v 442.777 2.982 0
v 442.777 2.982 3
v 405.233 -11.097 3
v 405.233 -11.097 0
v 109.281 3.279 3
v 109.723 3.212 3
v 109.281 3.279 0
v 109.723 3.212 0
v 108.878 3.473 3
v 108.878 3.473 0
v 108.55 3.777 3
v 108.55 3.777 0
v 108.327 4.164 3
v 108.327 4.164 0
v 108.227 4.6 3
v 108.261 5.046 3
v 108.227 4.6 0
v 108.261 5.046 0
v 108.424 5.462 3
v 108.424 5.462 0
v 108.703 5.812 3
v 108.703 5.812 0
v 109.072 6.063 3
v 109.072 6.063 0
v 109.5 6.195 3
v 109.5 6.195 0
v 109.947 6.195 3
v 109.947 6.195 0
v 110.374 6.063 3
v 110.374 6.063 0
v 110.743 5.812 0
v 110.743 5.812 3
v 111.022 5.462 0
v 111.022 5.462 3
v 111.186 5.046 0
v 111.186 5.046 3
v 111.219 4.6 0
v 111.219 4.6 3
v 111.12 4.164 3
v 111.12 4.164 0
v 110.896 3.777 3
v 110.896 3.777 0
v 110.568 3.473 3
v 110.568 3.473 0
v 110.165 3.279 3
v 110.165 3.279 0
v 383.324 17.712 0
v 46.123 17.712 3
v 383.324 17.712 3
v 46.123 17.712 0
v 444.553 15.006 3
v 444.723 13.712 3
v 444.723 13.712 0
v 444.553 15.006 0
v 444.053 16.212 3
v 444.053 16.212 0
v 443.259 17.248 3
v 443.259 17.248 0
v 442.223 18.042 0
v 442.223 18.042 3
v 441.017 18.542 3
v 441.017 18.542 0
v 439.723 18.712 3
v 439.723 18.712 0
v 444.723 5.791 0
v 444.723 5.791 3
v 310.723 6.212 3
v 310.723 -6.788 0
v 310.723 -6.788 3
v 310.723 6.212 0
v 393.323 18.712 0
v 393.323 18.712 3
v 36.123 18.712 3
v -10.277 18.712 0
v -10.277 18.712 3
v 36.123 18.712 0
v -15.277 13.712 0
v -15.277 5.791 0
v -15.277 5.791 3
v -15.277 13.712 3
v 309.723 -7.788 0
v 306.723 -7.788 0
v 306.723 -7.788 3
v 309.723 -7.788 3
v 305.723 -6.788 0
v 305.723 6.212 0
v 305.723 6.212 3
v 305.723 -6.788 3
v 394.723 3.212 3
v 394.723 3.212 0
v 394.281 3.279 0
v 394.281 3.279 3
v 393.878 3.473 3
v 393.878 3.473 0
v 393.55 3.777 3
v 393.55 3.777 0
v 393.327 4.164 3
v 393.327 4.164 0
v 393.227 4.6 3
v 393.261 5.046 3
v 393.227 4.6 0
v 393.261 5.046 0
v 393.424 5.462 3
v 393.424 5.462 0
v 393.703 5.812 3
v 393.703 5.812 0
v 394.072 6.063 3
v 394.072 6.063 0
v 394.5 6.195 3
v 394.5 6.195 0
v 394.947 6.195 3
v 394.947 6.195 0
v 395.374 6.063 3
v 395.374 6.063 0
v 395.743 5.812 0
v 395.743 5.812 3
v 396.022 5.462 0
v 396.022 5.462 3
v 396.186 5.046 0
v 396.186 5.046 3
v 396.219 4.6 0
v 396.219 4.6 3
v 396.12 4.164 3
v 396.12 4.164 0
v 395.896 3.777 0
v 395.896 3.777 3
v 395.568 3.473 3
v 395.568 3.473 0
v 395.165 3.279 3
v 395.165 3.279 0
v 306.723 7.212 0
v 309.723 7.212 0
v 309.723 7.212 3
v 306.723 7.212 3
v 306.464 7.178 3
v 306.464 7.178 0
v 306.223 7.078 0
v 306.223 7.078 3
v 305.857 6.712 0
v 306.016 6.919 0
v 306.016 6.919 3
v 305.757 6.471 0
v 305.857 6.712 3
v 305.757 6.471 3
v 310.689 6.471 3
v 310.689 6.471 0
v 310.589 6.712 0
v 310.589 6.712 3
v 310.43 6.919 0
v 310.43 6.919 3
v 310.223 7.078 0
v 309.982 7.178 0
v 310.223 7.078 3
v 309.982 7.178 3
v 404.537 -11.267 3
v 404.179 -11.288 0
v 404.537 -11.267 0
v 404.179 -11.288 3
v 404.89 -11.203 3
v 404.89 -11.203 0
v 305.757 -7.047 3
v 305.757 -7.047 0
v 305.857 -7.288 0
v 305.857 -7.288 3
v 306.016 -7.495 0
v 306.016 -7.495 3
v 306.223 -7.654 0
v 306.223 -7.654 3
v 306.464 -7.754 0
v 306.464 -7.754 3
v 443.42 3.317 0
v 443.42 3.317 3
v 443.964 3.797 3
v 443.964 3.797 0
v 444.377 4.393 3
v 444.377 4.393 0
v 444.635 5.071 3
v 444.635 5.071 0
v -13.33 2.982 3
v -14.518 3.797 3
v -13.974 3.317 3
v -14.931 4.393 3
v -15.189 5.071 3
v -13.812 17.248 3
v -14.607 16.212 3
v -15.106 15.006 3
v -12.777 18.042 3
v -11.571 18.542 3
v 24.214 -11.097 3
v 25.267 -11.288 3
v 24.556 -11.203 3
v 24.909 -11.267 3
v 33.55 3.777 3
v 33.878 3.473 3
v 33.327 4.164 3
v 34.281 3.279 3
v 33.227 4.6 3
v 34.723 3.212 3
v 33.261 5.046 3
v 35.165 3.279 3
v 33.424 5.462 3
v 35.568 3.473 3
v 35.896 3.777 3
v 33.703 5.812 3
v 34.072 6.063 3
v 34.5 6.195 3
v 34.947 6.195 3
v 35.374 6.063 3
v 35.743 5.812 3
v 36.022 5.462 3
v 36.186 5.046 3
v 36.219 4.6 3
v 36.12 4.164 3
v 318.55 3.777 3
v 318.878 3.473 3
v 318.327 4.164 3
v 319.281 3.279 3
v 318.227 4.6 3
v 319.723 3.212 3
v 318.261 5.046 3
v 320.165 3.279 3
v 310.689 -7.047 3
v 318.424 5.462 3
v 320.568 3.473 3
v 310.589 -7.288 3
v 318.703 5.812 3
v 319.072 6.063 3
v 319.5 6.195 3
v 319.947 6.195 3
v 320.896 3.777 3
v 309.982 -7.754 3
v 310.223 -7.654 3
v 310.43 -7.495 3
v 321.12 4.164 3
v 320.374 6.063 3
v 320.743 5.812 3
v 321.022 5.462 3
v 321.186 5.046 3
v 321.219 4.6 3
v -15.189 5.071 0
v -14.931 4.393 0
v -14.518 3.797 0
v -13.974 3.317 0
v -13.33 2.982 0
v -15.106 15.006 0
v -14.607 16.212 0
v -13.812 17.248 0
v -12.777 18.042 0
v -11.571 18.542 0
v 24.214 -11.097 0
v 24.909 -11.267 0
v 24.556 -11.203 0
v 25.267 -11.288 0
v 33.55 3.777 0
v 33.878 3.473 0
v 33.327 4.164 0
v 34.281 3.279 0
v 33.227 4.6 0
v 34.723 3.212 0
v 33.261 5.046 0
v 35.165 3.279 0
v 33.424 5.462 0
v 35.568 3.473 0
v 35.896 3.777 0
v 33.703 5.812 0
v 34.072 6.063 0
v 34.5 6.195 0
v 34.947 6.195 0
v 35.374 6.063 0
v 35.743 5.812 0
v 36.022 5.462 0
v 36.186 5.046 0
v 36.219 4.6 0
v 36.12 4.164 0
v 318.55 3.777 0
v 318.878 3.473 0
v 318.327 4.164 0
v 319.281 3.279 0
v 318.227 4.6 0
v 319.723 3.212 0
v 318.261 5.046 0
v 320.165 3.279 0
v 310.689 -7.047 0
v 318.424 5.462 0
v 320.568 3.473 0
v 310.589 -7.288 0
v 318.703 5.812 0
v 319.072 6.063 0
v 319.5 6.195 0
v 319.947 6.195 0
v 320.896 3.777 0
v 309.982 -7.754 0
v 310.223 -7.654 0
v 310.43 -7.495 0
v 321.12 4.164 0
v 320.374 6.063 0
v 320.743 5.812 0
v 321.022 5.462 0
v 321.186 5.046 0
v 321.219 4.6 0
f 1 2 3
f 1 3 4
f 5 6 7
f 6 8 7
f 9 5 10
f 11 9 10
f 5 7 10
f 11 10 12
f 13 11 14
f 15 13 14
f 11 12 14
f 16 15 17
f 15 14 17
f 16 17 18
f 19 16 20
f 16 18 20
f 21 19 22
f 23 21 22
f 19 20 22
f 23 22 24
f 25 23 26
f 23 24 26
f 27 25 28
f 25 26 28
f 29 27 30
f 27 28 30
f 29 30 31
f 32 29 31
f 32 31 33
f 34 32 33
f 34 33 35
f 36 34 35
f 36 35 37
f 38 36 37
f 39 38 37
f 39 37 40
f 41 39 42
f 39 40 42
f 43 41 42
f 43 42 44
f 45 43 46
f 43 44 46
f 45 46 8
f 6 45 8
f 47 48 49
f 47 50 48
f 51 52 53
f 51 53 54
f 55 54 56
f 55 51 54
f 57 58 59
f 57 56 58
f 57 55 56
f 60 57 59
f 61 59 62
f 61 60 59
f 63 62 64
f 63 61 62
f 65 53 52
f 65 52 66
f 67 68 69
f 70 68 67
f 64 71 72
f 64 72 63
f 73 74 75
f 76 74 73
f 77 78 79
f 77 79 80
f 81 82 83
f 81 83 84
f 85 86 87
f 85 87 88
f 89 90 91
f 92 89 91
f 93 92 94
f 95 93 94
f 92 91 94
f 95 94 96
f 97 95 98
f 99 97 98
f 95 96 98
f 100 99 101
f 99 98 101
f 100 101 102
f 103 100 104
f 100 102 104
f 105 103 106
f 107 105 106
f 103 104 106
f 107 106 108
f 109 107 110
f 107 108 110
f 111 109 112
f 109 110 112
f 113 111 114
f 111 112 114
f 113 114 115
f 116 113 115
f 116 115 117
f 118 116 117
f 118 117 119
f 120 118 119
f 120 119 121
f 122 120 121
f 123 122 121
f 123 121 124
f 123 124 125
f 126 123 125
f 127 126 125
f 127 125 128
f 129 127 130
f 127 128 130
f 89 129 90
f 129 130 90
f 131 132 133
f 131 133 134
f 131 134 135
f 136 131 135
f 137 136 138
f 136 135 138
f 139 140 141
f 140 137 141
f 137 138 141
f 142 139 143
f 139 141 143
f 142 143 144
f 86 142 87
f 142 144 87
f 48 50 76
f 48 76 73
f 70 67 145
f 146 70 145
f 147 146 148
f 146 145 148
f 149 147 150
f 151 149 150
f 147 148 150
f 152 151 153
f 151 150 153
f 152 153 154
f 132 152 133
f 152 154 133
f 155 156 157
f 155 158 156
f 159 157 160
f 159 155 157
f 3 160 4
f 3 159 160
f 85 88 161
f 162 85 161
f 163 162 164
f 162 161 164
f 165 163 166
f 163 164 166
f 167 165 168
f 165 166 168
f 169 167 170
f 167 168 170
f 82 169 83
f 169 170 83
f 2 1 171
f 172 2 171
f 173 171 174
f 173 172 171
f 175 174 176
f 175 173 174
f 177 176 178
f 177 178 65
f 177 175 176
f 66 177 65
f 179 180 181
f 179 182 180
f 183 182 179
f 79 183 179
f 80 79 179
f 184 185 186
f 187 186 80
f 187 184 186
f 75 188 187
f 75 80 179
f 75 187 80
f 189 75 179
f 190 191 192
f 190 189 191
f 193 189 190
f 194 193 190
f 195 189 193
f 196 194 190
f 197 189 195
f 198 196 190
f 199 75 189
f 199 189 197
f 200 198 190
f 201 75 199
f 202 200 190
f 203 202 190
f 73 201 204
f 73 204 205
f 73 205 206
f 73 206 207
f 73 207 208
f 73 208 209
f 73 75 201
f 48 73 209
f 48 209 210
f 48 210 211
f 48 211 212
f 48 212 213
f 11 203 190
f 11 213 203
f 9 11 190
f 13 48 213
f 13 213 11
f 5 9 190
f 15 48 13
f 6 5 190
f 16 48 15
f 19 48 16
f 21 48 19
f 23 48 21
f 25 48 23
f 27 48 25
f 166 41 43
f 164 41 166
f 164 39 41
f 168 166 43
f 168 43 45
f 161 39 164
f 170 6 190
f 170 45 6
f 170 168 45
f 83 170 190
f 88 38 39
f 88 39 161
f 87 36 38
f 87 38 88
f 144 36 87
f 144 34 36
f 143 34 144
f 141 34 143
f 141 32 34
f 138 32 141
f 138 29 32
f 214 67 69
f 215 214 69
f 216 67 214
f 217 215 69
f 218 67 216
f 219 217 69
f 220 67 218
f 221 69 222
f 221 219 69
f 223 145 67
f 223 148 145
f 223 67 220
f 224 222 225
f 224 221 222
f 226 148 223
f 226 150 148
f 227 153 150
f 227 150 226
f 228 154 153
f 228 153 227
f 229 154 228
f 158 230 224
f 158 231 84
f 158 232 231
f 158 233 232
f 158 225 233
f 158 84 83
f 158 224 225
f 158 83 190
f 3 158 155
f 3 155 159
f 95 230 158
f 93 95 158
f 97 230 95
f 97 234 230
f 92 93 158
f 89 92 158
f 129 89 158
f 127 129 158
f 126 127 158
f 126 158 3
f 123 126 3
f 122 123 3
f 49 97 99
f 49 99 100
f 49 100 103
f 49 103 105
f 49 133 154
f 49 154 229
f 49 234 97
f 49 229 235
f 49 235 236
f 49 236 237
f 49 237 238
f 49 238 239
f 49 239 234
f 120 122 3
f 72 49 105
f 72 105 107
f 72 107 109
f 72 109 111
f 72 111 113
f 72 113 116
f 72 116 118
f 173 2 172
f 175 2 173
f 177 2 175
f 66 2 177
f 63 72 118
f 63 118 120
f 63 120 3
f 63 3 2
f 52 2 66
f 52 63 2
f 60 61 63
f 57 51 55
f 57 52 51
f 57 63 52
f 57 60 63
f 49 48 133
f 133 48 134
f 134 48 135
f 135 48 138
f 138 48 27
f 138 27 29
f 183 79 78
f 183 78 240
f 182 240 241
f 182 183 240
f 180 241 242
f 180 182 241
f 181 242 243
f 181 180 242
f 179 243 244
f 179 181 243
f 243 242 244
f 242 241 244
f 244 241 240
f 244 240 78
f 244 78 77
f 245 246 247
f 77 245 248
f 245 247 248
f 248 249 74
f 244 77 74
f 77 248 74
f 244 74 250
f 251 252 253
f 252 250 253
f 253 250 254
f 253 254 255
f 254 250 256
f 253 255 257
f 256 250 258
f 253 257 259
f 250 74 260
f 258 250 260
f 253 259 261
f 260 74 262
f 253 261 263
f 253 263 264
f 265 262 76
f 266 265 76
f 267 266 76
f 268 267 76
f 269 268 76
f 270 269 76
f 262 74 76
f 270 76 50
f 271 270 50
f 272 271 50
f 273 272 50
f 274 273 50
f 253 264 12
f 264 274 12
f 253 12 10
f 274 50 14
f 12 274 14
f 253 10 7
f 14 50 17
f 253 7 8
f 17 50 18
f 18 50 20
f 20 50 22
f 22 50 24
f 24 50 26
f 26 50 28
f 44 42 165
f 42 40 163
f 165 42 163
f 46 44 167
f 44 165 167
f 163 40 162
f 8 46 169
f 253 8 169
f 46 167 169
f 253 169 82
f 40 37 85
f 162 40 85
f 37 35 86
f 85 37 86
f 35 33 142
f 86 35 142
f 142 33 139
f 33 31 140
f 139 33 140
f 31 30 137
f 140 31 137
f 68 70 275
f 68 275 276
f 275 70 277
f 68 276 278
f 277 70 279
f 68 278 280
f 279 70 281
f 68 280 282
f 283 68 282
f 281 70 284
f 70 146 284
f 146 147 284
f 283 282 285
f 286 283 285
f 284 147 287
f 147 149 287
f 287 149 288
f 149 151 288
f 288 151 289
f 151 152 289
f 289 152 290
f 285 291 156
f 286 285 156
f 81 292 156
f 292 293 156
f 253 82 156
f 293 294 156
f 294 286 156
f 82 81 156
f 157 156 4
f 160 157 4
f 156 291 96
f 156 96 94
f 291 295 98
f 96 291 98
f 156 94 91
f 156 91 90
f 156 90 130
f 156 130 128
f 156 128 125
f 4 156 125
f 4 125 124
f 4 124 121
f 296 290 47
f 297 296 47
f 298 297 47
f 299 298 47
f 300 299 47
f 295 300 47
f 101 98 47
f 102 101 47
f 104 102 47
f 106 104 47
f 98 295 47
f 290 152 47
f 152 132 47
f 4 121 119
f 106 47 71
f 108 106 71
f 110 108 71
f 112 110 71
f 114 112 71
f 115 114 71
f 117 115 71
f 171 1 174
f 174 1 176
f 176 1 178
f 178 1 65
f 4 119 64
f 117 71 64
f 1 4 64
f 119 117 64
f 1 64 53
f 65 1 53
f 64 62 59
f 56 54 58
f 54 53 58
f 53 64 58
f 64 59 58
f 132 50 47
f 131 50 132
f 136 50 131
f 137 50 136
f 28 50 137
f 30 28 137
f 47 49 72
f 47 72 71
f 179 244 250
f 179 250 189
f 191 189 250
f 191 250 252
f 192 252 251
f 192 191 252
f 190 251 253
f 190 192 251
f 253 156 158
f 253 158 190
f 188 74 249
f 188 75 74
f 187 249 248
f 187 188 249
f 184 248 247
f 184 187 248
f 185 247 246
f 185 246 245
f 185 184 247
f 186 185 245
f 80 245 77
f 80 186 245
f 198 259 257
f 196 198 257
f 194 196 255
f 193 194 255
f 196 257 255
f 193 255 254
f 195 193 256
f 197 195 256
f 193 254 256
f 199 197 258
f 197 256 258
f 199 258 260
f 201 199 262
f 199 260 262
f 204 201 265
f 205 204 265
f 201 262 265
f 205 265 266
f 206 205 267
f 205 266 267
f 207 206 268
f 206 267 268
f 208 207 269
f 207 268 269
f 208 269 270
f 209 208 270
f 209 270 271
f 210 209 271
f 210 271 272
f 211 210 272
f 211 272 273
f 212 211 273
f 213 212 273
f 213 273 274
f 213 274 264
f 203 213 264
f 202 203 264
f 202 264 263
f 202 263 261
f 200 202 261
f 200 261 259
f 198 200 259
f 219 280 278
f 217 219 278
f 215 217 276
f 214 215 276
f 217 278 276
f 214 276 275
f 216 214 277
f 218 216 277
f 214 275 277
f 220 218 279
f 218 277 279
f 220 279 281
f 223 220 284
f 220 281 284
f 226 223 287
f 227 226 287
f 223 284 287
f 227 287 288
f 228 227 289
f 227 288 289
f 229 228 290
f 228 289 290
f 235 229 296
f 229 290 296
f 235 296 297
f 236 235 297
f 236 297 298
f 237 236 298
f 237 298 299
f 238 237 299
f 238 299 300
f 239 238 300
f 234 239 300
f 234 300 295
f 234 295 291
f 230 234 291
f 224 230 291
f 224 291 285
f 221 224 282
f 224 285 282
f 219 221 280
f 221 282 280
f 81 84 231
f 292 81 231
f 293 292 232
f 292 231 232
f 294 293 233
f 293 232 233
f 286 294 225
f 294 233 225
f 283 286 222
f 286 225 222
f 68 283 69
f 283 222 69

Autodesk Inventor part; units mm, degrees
ref_plane "YZ Plane" through (0, 0, 0) normal (1, 0, 0) x (0, 1, 0)
ref_plane "XZ Plane" through (0, 0, 0) normal (0, 1, 0) x (-1, 0, 0)
ref_plane "XY Plane" through (0, 0, 0) normal (0, 0, 1) x (1, 0, 0)
sketch "Szkic1" plane through (0, 0, 0) normal (0, 0, 1) x (1, 0, 0)
  line L0 (444.7232, 18.712) -> (444.7232, -11.288)
  line L1 (444.7232, -11.288) -> (-15.2768, -11.288)
  line L2 (-15.2768, -11.288) -> (-15.2768, 18.712)
  line L3 (-15.2768, 18.712) -> (36.1232, 18.712)
  line L4 (36.1232, 18.712) -> (36.1232, 17.712)
  line L5 (36.1232, 17.712) -> (393.3232, 17.712)
  line L6 (393.3232, 17.712) -> (393.3232, 18.712)
  line L7 (393.3232, 18.712) -> (444.7232, 18.712)
  point P0 (0, 0)
  dimension "d0" = 460
  dimension "d1" = 30
  dimension "d2" = 1
  dimension "d3" = 51.4
  dimension "d4" = 51.4
extrude "Wyciągnięcie proste1" add sketch "Szkic1" along normal blind 3
chamfer "Faza1" distance 10 distance2 1 1 edges at (36.1232, 17.712, 1.5) measured on face at (274.2565, 17.712, 1)
chamfer "Faza2" distance 10 distance2 1 1 edges at (393.3232, 17.712, 1.5) measured on face at (277.5897, 17.712, 1)
fillet "Zaokrąglenie1" radius 5 2 edges at (444.7232, 18.712, 1.5) (-15.2768, 18.712, 1.5)
chamfer "Faza3" distance 40 distance2 15 1 edges at (444.7232, -11.288, 1.5) measured on face at (138.0565, -11.288, 1)
chamfer "Faza4" distance 40 distance2 15 1 edges at (-15.2768, -11.288, 1.5) measured on face at (124.7232, -11.288, 2)
sketch "Szkic2" plane through (0, 0, 3) normal (0, 0, 1) x (1, 0, 0)
  line L0 (383.3232, 17.712) -> (46.1232, 17.712) projected
  line L1 (-15.2768, 13.712) -> (-15.2768, 3.712) projected
  line L2 (444.7232, 3.712) -> (444.7232, 13.712) projected
  line L3 (36.1232, 18.712) -> (-10.2768, 18.712) projected
  line L4 (439.7232, 18.712) -> (393.3232, 18.712) projected
  point P0 (0, 0)
  point P1 (34.7232, 4.712)
  point P2 (394.7232, 4.712)
  point P3 (109.7232, 4.712)
  point P4 (319.7232, 4.712)
  dimension "d34" = 50
  dimension "d35" = 75
  dimension "d36" = 75
  dimension "d37" = 50
  dimension "d39" = 14
  dimension "d40" = 14
  dimension "d41" = 14
  dimension "d42" = 14
fillet "Zaokrąglenie2" radius 3 4 edges at (444.7232, 3.712, 1.5) (404.7232, -11.288, 1.5) (24.7232, -11.288, 1.5) (-15.2768, 3.712, 1.5)
hole "Otwór1" at (34.7232, 4.712, 3) at (394.7232, 4.712, 3) at (109.7232, 4.712, 3) at (319.7232, 4.712, 3) direction (0, 0, -1) diameter 3 end through all
sketch "Szkic4" plane through (0, 0, 0) normal (0, 0, -1) x (-1, 0, 0)
  circle A0 centre (-109.7232, 4.712) radius 1.5 projected
  circle A1 centre (-34.7232, 4.712) radius 1.5 projected
  circle A2 centre (-394.7232, 4.712) radius 1.5 projected
  circle A3 centre (-319.7232, 4.712) radius 1.5 projected
  arc A4 (13.3302, 2.9821) -> (15.2768, 5.791) centre (12.2768, 5.791) ccw projected
  line L0 (15.2768, 13.712) -> (15.2768, 5.791) projected
  arc A5 (15.2768, 13.712) -> (10.2768, 18.712) centre (10.2768, 13.712) ccw projected
  line L1 (-36.1232, 18.712) -> (10.2768, 18.712) projected
  line L2 (-46.1232, 17.712) -> (-36.1232, 18.712) projected
  line L3 (-383.3232, 17.712) -> (-46.1232, 17.712) projected
  line L4 (-393.3232, 18.712) -> (-383.3232, 17.712) projected
  line L5 (-439.7232, 18.712) -> (-393.3232, 18.712) projected
  arc A6 (-439.7232, 18.712) -> (-444.7232, 13.712) centre (-439.7232, 13.712) ccw projected
  line L6 (-444.7232, 5.791) -> (-444.7232, 13.712) projected
  arc A7 (-444.7232, 5.791) -> (-442.7766, 2.9821) centre (-441.7232, 5.791) ccw projected
  line L7 (-405.2326, -11.0969) -> (-442.7766, 2.9821) projected
  arc A8 (-405.2326, -11.0969) -> (-404.1792, -11.288) centre (-404.1792, -8.288) ccw projected
  line L8 (-25.2672, -11.288) -> (-404.1792, -11.288) projected
  arc A9 (-25.2672, -11.288) -> (-24.2138, -11.0969) centre (-25.2672, -8.288) ccw projected
  line L9 (13.3302, 2.9821) -> (-24.2138, -11.0969) projected
  line L10 (-292.2232, 13.612) -> (-12.8371, 13.612) construction
  line L11 (-12.8371, 13.612) -> (-12.8371, -7.1032) construction
  line L12 (-12.8371, -7.1032) -> (-292.2232, -7.1032) construction
  line L13 (-292.2232, -7.1032) -> (-292.2232, 13.612) construction
  point P0 (0, 0)
  dimension "d43" = 4.1
  dimension "d44" = 152.5
extrude "Wyciągnięcie proste3" [suppressed]
sketch "Szkic5" plane through (0, 0, 0) normal (0, 0, -1) x (-1, 0, 0)
  arc A0 (13.3302, 2.9821) -> (15.2768, 5.791) centre (12.2768, 5.791) ccw projected
  line L0 (15.2768, 13.712) -> (15.2768, 5.791) projected
  arc A1 (15.2768, 13.712) -> (10.2768, 18.712) centre (10.2768, 13.712) ccw projected
  line L1 (-36.1232, 18.712) -> (10.2768, 18.712) projected
  line L2 (-46.1232, 17.712) -> (-36.1232, 18.712) projected
  line L3 (-383.3232, 17.712) -> (-46.1232, 17.712) projected
  line L4 (-393.3232, 18.712) -> (-383.3232, 17.712) projected
  line L5 (-439.7232, 18.712) -> (-393.3232, 18.712) projected
  arc A2 (-439.7232, 18.712) -> (-444.7232, 13.712) centre (-439.7232, 13.712) ccw projected
  line L6 (-444.7232, 5.791) -> (-444.7232, 13.712) projected
  arc A3 (-444.7232, 5.791) -> (-442.7766, 2.9821) centre (-441.7232, 5.791) ccw projected
  line L7 (-405.2326, -11.0969) -> (-442.7766, 2.9821) projected
  arc A4 (-405.2326, -11.0969) -> (-404.1792, -11.288) centre (-404.1792, -8.288) ccw projected
  line L8 (-25.2672, -11.288) -> (-404.1792, -11.288) projected
  arc A5 (-25.2672, -11.288) -> (-24.2138, -11.0969) centre (-25.2672, -8.288) ccw projected
  line L9 (13.3302, 2.9821) -> (-24.2138, -11.0969) projected
  circle A6 centre (-319.7232, 4.712) radius 1.5 projected
  circle A7 centre (-394.7232, 4.712) radius 1.5 projected
  circle A8 centre (-34.7232, 4.712) radius 1.5 projected
  circle A9 centre (-109.7232, 4.712) radius 1.5 projected
  line L10 (-436.9348, 14.712) -> (34.576, 14.712)
  line L11 (-429.8152, 7.212) -> (-144.7013, 7.212)
  line L12 (-310.7232, 7.212) -> (-305.7232, 7.212)
  line L13 (-305.7232, 7.212) -> (-305.7232, -7.788)
  line L14 (-305.7232, -7.788) -> (-310.7232, -7.788)
  line L15 (-310.7232, -7.788) -> (-310.7232, 7.212)
  line L16 (-428.7978, 2.212) -> (-310.7232, 2.212)
  line L17 (-305.7232, 2.212) -> (-143.684, 2.212)
  line L18 (-434.2328, -5.288) -> (-310.7232, -5.288)
  line L19 (-305.7232, -5.288) -> (47.3582, -5.288)
  point P0 (0, 0)
  dimension "d47" = 3
  dimension "d49" = 2.5
  dimension "d51" = 5
  dimension "d52" = 15
  dimension "d54" = 9
extrude "Wyciągnięcie proste4" cut sketch "Szkic5" against normal through all contours L13 L14 L15 L11
fillet "Zaokrąglenie3" radius 1 4 edges at (305.7232, -7.788, 1.5) (310.7232, -7.788, 1.5) (310.7232, 7.212, 1.5) (305.7232, 7.212, 1.5)
equation "\"d4\" = d3"
equation "\"d37\" = d34"
equation "\"d40\" = d39"
equation "\"d41\" = d39"
equation "\"d42\" = d39"
properties part number "LC_PLEXI_3mm_Heatbed_Platform_Logo_Plate_Diffuser"
